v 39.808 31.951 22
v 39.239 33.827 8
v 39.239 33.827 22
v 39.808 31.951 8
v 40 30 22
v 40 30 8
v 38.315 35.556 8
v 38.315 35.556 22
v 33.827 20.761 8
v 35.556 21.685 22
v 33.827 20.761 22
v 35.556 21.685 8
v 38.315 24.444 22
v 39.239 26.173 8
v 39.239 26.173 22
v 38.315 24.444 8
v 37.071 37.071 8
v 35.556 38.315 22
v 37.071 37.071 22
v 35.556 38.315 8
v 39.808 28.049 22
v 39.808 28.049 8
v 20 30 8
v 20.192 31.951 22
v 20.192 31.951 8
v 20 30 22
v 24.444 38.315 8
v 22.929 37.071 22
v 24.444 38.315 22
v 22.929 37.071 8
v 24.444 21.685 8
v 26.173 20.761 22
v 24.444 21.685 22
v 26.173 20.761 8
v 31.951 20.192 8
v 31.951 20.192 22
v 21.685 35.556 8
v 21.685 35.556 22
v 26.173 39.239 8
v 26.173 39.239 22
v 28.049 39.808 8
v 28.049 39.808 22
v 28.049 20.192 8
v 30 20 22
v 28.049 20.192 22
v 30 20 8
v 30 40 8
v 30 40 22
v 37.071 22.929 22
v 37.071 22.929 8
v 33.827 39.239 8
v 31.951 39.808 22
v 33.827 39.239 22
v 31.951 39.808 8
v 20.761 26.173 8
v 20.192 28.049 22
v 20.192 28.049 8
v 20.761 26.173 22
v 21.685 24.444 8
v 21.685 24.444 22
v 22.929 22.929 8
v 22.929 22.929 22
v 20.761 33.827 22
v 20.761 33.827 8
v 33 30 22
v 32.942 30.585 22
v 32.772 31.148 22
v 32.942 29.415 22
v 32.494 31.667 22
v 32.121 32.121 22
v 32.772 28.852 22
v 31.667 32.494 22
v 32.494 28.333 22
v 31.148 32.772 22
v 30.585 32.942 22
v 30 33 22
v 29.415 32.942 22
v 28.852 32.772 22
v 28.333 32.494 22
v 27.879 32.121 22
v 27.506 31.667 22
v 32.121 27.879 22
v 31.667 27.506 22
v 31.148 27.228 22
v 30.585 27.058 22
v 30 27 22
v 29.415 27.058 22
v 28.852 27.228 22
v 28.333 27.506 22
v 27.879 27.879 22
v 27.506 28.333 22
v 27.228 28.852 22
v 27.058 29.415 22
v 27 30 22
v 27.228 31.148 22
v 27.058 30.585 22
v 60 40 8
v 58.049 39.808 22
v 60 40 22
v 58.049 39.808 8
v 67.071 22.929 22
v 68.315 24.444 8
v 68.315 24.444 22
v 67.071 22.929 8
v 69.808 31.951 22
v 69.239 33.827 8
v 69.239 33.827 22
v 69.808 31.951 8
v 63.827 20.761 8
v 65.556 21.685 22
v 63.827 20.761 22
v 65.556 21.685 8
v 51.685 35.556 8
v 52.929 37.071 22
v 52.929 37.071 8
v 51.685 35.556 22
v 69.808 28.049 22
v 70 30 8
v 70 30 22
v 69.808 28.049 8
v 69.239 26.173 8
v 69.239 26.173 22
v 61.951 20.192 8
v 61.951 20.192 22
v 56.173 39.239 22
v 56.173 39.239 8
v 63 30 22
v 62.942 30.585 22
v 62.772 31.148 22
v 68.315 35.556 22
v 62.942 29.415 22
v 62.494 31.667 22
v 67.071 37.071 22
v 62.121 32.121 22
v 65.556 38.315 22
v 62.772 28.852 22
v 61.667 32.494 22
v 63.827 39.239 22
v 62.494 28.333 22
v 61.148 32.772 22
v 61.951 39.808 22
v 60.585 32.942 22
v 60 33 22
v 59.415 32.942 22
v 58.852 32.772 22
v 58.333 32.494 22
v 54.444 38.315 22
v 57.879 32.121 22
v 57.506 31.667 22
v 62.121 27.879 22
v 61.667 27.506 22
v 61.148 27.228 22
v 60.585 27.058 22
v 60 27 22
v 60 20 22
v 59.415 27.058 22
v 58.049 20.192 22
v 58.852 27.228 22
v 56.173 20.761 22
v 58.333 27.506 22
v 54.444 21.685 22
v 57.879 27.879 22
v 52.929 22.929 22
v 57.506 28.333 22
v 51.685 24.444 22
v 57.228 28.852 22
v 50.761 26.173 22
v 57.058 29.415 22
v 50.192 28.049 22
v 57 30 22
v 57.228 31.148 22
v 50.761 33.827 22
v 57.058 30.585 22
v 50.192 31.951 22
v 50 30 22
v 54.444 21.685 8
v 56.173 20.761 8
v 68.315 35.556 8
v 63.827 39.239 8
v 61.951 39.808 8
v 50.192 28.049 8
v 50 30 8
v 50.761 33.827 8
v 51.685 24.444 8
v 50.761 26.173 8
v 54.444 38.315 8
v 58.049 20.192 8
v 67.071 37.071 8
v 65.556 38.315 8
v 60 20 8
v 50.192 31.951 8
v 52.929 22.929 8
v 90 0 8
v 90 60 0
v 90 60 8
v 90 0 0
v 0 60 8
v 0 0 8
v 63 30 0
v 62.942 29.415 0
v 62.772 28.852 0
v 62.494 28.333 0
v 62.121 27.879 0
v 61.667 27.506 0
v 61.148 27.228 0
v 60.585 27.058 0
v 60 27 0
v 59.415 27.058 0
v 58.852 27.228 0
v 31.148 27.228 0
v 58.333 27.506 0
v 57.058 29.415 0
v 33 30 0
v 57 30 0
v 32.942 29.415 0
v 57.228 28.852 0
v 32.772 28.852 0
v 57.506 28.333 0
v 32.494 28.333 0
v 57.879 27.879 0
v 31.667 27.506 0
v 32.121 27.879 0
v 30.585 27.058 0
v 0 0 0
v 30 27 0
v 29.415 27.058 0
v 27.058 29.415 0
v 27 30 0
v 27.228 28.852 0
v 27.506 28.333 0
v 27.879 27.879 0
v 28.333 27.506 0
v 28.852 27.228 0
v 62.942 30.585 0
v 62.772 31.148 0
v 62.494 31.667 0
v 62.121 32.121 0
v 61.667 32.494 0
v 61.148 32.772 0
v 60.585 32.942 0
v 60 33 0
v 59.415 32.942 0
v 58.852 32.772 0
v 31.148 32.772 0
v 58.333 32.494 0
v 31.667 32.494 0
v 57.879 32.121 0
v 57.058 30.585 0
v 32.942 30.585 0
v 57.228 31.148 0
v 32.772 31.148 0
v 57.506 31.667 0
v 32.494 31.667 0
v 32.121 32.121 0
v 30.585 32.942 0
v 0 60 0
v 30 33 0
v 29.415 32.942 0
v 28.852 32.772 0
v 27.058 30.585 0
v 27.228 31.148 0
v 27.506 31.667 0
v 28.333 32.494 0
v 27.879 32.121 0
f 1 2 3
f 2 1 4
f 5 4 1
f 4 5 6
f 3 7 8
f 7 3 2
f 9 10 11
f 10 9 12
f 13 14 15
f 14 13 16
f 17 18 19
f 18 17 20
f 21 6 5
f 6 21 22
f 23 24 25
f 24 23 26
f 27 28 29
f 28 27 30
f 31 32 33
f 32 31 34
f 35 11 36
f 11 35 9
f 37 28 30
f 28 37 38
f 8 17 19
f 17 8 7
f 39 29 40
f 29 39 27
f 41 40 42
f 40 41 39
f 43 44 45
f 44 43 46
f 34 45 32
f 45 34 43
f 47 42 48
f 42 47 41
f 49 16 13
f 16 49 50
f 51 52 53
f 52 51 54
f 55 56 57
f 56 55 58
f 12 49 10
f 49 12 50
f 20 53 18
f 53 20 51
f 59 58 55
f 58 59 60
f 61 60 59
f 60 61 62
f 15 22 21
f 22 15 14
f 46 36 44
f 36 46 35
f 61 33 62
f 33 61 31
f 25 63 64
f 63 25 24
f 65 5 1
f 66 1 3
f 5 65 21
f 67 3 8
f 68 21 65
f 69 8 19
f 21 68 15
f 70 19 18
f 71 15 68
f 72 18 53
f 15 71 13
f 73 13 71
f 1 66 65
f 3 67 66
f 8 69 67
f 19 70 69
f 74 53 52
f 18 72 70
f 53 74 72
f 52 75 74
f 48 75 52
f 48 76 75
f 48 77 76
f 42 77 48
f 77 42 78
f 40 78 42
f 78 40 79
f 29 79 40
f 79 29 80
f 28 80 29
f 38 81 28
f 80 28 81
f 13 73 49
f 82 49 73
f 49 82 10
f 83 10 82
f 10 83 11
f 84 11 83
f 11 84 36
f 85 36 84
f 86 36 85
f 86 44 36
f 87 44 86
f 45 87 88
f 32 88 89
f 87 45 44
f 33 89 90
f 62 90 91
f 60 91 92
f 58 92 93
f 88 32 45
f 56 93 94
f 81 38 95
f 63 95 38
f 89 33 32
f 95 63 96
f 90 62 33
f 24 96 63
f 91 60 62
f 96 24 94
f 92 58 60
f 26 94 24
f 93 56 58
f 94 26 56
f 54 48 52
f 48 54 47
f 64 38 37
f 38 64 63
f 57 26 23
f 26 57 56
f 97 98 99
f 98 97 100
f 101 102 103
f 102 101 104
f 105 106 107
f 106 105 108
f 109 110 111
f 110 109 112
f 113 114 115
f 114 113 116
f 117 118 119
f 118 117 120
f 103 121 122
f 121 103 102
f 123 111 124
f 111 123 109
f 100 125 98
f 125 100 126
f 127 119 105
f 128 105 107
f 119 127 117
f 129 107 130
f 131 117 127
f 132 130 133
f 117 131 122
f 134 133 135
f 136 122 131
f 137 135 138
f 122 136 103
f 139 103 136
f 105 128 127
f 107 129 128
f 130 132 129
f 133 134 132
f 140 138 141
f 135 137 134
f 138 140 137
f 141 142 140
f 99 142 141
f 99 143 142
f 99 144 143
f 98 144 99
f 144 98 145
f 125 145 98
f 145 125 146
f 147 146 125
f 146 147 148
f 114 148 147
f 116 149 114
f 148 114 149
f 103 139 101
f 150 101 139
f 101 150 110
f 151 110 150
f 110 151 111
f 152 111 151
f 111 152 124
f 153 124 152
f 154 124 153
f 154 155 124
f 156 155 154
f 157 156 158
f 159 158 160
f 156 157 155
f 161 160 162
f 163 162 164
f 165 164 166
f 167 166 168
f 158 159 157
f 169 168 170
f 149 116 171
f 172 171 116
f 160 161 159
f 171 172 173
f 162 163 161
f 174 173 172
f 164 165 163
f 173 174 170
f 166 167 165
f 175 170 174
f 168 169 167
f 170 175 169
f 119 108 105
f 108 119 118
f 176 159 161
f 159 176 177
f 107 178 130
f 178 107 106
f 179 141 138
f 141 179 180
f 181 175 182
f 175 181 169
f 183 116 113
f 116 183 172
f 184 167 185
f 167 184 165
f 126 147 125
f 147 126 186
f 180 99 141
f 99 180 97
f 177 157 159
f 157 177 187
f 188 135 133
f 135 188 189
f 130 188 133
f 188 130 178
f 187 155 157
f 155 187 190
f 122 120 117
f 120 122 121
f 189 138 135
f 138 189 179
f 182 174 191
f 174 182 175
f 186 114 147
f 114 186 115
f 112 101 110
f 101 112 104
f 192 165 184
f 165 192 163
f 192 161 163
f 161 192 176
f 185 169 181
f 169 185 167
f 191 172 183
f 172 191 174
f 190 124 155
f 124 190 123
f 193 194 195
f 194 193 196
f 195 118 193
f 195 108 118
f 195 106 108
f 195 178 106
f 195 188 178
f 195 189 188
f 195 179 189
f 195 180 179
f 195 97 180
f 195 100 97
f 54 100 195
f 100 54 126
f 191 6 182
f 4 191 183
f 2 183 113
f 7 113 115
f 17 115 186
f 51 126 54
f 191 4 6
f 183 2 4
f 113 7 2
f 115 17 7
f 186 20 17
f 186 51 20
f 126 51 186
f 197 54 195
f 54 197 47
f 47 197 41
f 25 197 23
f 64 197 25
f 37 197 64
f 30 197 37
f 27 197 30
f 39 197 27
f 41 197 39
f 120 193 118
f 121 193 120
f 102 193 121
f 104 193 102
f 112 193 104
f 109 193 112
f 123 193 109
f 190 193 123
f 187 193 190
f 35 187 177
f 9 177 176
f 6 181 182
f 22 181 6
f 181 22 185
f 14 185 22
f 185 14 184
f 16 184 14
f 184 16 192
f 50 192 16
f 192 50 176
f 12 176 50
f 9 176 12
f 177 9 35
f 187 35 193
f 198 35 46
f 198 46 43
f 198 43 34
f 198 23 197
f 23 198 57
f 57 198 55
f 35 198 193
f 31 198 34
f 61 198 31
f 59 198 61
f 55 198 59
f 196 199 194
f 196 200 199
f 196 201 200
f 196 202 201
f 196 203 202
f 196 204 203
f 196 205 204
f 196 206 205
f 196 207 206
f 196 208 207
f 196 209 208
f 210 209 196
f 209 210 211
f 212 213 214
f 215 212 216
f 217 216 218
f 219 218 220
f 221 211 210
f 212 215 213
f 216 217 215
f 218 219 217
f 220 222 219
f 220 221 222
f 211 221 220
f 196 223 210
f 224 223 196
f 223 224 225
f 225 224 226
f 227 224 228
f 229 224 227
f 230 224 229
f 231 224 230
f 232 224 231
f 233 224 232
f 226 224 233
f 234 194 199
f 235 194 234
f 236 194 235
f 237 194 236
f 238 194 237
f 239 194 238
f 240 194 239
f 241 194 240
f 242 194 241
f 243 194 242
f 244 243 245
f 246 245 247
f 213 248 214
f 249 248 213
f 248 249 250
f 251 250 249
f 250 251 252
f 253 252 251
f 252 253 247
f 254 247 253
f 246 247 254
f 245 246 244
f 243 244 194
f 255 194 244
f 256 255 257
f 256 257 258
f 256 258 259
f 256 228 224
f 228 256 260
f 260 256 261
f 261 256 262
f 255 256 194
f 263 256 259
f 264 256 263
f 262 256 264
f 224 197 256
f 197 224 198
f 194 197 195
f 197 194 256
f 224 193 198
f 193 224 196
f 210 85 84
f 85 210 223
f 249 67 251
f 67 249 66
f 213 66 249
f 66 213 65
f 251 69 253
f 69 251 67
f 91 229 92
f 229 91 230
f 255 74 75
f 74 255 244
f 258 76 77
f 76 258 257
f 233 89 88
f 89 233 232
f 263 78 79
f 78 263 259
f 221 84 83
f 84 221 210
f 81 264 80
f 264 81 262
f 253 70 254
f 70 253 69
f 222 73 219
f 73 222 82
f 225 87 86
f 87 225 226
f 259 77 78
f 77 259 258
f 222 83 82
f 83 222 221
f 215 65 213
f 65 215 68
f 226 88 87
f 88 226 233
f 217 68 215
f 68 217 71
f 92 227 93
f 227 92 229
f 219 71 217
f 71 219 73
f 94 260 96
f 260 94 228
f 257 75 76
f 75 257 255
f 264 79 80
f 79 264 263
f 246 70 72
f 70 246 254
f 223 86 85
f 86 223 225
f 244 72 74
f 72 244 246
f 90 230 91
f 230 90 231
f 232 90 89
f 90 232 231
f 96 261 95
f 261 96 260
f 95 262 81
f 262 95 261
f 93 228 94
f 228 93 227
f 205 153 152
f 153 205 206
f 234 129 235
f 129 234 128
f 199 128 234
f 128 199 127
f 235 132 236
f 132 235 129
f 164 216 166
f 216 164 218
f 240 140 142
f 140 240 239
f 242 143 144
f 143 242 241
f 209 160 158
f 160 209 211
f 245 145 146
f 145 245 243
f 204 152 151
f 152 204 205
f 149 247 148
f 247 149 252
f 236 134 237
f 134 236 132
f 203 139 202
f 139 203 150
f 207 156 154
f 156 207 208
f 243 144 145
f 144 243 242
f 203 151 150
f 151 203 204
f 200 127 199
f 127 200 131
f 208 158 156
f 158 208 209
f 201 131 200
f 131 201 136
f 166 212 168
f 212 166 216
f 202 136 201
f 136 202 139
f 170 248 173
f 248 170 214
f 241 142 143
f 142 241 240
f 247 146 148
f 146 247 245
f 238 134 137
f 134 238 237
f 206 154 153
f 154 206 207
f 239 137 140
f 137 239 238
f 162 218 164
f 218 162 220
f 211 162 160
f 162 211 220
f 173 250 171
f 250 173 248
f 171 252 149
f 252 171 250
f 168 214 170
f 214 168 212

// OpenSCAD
$fn = 32;

// ----------------------------------------------------------------------
// Drill jig: two_boss jig
// ----------------------------------------------------------------------

// --- parameters (mm) ---
plate_l = 90;             // plate length, X
plate_w = 60;             // plate width, Y
plate_t = 8;              // plate thickness
boss_d = 20;              // guide boss diameter
boss_h = 15;              // boss height above the plate
guide_d = 6;              // guide hole diameter
boss_pitch = 30;          // boss pitch

n_boss = 2;  // guide bosses
boss_x0 = (plate_l - (n_boss - 1) * boss_pitch) / 2;  // first boss X
boss_top = plate_t - 1 + boss_h;  // boss crown height
total_h = boss_top;  // overall height

difference() {
  union() {
  cube([plate_l, plate_w, plate_t]);
  for (i = [0 : n_boss - 1])
    translate([boss_x0 + i * boss_pitch, plate_w / 2, plate_t - 1])
      cylinder(h = boss_h, d = boss_d);
  }
  for (i = [0 : n_boss - 1])
    translate([boss_x0 + i * boss_pitch, plate_w / 2, -1])
      cylinder(h = plate_t + boss_h, d = guide_d);
}
